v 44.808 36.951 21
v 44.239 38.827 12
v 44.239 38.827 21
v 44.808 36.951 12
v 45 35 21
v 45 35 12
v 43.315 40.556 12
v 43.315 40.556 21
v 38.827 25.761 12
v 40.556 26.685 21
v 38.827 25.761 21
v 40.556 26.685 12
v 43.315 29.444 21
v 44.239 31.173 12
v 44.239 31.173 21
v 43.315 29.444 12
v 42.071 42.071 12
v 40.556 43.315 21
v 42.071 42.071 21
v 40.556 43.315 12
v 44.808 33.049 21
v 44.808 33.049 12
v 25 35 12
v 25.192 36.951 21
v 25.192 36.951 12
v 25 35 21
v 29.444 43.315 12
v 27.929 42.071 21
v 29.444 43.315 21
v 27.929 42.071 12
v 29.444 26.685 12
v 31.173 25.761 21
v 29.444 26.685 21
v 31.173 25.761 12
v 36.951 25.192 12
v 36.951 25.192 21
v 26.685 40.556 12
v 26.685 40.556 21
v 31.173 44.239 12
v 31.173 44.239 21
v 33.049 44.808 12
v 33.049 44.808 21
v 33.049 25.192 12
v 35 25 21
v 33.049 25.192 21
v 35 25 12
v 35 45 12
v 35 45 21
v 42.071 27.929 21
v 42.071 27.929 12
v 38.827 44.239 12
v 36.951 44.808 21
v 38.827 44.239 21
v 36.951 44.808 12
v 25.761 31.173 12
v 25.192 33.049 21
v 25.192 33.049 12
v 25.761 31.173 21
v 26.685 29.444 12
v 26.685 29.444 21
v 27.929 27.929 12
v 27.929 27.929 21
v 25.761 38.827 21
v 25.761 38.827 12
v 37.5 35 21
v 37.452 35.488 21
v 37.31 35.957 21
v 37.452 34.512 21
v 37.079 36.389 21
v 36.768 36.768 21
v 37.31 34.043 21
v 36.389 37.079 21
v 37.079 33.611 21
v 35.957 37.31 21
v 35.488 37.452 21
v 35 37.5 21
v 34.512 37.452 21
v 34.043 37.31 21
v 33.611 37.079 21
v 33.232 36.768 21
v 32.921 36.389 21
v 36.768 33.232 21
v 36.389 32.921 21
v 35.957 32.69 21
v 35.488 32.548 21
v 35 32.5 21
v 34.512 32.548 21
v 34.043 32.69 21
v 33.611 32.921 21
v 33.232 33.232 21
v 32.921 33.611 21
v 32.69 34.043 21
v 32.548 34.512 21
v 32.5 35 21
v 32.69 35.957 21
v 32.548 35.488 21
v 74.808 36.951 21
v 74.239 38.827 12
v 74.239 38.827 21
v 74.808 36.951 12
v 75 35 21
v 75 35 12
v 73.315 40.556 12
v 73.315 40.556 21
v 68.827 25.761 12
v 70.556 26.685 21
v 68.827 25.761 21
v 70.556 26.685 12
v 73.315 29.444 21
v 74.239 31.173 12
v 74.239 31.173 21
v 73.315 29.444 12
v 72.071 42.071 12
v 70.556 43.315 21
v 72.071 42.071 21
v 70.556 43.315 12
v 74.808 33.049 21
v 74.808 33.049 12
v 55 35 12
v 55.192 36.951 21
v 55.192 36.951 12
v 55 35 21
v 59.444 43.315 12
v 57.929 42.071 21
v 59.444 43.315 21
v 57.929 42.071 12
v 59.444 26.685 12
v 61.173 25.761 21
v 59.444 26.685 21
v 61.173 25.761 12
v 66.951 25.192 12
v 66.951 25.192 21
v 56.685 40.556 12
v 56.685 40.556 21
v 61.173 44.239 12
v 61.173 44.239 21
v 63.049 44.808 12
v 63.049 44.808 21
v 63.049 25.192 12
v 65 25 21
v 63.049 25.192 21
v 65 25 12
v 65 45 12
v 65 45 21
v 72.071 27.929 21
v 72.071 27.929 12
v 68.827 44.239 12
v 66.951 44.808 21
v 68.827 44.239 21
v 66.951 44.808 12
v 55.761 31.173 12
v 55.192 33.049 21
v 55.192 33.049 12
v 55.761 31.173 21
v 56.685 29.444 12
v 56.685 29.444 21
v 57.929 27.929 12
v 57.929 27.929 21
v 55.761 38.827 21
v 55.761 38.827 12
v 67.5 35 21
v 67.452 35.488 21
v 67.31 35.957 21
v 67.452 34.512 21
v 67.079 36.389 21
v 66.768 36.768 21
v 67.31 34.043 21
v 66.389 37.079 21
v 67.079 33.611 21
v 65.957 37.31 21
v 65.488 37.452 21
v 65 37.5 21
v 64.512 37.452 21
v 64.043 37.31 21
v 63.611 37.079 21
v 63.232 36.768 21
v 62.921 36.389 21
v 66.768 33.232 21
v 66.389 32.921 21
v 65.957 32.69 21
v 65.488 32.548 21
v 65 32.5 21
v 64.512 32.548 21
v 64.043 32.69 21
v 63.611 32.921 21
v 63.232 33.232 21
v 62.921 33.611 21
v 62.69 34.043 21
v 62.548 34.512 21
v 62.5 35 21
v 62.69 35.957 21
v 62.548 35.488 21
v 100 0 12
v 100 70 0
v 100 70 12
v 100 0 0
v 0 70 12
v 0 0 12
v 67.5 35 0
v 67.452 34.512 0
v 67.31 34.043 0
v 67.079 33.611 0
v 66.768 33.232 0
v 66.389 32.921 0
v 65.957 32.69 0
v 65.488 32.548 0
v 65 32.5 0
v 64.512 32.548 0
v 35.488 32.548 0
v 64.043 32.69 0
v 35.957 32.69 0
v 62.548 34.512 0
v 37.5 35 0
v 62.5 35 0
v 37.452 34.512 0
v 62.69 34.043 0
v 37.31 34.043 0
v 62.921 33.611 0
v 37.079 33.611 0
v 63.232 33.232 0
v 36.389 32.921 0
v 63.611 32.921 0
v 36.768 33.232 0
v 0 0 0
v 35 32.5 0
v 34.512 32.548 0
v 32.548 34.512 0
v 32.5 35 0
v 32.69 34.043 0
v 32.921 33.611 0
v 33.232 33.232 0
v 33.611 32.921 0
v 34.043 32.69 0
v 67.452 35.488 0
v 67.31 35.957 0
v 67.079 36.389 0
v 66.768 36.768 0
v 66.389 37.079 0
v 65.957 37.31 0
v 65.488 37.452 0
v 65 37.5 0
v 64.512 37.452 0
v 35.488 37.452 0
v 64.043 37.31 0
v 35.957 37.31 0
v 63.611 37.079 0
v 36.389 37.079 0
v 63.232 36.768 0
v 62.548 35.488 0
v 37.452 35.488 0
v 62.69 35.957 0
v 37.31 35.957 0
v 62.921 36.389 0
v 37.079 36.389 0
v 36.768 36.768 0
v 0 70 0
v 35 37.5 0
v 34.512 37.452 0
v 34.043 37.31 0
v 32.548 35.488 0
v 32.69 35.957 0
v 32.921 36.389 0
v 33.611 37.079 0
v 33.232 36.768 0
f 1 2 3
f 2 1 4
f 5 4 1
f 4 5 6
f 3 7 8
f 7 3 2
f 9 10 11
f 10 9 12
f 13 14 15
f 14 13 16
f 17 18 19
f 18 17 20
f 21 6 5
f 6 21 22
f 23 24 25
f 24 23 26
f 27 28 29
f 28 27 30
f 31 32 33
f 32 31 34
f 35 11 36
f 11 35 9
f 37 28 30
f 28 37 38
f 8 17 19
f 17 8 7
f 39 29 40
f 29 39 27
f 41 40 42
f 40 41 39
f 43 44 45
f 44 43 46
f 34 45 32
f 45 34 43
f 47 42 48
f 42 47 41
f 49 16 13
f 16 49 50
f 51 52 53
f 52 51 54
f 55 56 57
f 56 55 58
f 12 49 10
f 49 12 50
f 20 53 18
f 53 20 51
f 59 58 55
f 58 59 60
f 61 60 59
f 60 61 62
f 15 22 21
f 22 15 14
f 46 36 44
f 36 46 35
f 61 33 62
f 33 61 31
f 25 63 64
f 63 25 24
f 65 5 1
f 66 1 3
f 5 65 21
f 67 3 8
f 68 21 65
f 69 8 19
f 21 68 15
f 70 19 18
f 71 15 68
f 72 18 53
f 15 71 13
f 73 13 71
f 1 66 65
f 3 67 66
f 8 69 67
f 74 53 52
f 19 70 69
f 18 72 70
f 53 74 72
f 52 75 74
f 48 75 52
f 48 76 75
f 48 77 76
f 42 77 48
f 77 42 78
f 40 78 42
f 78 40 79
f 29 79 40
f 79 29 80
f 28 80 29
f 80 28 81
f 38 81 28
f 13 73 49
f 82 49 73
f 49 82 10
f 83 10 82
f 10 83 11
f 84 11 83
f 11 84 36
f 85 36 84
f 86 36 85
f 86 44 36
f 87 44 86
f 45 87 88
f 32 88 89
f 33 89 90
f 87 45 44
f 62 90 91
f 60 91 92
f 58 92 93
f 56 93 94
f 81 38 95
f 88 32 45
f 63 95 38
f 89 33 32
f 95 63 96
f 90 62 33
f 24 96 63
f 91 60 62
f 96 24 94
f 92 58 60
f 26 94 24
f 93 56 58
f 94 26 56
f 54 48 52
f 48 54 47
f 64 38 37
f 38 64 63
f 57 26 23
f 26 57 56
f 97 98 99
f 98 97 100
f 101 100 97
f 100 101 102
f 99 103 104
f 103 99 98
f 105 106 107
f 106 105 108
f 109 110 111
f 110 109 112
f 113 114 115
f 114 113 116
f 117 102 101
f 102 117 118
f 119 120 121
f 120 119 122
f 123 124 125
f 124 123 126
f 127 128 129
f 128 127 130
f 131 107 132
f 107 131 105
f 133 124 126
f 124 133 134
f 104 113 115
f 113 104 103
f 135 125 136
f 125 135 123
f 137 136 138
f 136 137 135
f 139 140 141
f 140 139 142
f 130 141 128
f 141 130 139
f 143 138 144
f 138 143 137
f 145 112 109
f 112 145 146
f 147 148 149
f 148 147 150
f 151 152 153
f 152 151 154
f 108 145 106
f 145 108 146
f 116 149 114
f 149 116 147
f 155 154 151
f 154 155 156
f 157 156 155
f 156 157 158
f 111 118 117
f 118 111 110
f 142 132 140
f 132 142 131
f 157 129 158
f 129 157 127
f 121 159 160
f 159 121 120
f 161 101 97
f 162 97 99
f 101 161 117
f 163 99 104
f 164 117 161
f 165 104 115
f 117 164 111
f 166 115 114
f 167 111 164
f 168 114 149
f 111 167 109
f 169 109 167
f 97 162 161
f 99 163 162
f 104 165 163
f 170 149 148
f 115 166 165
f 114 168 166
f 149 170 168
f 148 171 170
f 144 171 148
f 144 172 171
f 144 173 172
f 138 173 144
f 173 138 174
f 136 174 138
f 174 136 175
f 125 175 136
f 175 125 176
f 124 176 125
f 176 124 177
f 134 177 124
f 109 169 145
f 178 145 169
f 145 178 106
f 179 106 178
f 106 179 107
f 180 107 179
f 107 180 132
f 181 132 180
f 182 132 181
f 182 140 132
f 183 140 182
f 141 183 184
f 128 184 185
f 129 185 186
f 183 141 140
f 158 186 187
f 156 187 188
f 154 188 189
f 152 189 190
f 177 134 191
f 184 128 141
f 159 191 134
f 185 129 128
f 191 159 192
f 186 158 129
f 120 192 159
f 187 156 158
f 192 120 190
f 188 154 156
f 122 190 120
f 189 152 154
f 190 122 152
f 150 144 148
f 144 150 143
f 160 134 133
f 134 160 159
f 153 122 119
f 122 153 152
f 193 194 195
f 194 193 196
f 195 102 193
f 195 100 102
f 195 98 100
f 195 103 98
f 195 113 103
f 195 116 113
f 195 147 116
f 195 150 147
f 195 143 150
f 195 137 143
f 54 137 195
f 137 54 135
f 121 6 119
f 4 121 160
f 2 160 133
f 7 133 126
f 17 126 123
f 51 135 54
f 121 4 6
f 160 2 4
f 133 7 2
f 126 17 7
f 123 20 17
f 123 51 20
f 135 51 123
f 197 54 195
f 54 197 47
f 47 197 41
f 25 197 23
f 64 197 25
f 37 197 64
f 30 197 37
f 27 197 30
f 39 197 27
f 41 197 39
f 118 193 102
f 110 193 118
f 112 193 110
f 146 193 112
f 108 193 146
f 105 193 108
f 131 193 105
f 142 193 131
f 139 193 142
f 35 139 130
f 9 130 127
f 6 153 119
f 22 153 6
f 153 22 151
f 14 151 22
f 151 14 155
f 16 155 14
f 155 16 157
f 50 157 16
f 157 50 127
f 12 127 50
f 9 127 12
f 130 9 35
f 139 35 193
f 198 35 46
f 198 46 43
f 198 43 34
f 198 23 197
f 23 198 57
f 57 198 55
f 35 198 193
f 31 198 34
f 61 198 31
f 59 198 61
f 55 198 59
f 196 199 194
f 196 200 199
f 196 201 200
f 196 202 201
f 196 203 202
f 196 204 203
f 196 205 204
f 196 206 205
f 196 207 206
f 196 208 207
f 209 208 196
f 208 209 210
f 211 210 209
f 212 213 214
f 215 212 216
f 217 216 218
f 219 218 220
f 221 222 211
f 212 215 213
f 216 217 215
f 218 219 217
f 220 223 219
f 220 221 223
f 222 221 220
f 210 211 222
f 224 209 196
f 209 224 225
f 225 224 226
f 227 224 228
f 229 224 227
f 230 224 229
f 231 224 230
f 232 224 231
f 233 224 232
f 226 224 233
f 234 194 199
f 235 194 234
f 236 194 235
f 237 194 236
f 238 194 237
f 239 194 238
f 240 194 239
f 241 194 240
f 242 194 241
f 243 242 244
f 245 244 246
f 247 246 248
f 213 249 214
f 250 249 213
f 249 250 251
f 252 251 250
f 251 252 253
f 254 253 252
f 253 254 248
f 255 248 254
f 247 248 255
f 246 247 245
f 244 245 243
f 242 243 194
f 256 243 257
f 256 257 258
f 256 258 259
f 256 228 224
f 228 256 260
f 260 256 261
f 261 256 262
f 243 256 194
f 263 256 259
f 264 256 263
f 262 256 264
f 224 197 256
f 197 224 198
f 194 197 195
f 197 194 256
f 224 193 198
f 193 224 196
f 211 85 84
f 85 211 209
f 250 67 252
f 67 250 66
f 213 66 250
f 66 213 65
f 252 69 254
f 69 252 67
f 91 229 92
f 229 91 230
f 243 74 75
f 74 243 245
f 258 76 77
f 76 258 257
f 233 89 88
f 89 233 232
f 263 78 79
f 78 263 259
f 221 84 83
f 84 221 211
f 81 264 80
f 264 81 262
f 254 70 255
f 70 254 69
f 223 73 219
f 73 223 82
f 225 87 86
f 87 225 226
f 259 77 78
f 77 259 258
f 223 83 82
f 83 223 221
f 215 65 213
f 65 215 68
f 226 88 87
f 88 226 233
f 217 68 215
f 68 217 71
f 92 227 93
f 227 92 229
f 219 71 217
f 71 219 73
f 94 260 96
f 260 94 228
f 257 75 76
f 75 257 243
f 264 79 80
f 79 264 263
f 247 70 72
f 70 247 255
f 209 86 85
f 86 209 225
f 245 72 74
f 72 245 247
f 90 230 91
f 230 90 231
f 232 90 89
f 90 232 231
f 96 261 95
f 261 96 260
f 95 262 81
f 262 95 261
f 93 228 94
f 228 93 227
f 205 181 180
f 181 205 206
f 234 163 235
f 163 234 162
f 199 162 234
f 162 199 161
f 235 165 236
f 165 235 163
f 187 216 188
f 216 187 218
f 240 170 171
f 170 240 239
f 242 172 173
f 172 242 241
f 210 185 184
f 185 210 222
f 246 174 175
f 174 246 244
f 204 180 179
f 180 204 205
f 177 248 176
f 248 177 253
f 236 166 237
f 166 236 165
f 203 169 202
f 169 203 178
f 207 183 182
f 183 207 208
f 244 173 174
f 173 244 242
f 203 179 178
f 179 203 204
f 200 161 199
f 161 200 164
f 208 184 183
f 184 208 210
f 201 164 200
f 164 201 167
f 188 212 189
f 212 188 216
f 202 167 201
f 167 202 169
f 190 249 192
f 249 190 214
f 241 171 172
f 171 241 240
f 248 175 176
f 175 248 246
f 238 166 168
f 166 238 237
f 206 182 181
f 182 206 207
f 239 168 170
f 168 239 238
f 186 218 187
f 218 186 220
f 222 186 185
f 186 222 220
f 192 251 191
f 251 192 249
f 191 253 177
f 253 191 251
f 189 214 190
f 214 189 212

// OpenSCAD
$fn = 32;

// ----------------------------------------------------------------------
// Drill jig: two_boss jig
// ----------------------------------------------------------------------

// --- parameters (mm) ---
plate_l = 100;            // plate length, X
plate_w = 70;             // plate width, Y
plate_t = 12;             // plate thickness
boss_d = 20;              // guide boss diameter
boss_h = 10;              // boss height above the plate
guide_d = 5;              // guide hole diameter
boss_pitch = 30;          // boss pitch

n_boss = 2;  // guide bosses
boss_x0 = (plate_l - (n_boss - 1) * boss_pitch) / 2;  // first boss X
boss_top = plate_t - 1 + boss_h;  // boss crown height
total_h = boss_top;  // overall height

difference() {
  union() {
  cube([plate_l, plate_w, plate_t]);
  for (i = [0 : n_boss - 1])
    translate([boss_x0 + i * boss_pitch, plate_w / 2, plate_t - 1])
      cylinder(h = boss_h, d = boss_d);
  }
  for (i = [0 : n_boss - 1])
    translate([boss_x0 + i * boss_pitch, plate_w / 2, -1])
      cylinder(h = plate_t + boss_h, d = guide_d);
}
